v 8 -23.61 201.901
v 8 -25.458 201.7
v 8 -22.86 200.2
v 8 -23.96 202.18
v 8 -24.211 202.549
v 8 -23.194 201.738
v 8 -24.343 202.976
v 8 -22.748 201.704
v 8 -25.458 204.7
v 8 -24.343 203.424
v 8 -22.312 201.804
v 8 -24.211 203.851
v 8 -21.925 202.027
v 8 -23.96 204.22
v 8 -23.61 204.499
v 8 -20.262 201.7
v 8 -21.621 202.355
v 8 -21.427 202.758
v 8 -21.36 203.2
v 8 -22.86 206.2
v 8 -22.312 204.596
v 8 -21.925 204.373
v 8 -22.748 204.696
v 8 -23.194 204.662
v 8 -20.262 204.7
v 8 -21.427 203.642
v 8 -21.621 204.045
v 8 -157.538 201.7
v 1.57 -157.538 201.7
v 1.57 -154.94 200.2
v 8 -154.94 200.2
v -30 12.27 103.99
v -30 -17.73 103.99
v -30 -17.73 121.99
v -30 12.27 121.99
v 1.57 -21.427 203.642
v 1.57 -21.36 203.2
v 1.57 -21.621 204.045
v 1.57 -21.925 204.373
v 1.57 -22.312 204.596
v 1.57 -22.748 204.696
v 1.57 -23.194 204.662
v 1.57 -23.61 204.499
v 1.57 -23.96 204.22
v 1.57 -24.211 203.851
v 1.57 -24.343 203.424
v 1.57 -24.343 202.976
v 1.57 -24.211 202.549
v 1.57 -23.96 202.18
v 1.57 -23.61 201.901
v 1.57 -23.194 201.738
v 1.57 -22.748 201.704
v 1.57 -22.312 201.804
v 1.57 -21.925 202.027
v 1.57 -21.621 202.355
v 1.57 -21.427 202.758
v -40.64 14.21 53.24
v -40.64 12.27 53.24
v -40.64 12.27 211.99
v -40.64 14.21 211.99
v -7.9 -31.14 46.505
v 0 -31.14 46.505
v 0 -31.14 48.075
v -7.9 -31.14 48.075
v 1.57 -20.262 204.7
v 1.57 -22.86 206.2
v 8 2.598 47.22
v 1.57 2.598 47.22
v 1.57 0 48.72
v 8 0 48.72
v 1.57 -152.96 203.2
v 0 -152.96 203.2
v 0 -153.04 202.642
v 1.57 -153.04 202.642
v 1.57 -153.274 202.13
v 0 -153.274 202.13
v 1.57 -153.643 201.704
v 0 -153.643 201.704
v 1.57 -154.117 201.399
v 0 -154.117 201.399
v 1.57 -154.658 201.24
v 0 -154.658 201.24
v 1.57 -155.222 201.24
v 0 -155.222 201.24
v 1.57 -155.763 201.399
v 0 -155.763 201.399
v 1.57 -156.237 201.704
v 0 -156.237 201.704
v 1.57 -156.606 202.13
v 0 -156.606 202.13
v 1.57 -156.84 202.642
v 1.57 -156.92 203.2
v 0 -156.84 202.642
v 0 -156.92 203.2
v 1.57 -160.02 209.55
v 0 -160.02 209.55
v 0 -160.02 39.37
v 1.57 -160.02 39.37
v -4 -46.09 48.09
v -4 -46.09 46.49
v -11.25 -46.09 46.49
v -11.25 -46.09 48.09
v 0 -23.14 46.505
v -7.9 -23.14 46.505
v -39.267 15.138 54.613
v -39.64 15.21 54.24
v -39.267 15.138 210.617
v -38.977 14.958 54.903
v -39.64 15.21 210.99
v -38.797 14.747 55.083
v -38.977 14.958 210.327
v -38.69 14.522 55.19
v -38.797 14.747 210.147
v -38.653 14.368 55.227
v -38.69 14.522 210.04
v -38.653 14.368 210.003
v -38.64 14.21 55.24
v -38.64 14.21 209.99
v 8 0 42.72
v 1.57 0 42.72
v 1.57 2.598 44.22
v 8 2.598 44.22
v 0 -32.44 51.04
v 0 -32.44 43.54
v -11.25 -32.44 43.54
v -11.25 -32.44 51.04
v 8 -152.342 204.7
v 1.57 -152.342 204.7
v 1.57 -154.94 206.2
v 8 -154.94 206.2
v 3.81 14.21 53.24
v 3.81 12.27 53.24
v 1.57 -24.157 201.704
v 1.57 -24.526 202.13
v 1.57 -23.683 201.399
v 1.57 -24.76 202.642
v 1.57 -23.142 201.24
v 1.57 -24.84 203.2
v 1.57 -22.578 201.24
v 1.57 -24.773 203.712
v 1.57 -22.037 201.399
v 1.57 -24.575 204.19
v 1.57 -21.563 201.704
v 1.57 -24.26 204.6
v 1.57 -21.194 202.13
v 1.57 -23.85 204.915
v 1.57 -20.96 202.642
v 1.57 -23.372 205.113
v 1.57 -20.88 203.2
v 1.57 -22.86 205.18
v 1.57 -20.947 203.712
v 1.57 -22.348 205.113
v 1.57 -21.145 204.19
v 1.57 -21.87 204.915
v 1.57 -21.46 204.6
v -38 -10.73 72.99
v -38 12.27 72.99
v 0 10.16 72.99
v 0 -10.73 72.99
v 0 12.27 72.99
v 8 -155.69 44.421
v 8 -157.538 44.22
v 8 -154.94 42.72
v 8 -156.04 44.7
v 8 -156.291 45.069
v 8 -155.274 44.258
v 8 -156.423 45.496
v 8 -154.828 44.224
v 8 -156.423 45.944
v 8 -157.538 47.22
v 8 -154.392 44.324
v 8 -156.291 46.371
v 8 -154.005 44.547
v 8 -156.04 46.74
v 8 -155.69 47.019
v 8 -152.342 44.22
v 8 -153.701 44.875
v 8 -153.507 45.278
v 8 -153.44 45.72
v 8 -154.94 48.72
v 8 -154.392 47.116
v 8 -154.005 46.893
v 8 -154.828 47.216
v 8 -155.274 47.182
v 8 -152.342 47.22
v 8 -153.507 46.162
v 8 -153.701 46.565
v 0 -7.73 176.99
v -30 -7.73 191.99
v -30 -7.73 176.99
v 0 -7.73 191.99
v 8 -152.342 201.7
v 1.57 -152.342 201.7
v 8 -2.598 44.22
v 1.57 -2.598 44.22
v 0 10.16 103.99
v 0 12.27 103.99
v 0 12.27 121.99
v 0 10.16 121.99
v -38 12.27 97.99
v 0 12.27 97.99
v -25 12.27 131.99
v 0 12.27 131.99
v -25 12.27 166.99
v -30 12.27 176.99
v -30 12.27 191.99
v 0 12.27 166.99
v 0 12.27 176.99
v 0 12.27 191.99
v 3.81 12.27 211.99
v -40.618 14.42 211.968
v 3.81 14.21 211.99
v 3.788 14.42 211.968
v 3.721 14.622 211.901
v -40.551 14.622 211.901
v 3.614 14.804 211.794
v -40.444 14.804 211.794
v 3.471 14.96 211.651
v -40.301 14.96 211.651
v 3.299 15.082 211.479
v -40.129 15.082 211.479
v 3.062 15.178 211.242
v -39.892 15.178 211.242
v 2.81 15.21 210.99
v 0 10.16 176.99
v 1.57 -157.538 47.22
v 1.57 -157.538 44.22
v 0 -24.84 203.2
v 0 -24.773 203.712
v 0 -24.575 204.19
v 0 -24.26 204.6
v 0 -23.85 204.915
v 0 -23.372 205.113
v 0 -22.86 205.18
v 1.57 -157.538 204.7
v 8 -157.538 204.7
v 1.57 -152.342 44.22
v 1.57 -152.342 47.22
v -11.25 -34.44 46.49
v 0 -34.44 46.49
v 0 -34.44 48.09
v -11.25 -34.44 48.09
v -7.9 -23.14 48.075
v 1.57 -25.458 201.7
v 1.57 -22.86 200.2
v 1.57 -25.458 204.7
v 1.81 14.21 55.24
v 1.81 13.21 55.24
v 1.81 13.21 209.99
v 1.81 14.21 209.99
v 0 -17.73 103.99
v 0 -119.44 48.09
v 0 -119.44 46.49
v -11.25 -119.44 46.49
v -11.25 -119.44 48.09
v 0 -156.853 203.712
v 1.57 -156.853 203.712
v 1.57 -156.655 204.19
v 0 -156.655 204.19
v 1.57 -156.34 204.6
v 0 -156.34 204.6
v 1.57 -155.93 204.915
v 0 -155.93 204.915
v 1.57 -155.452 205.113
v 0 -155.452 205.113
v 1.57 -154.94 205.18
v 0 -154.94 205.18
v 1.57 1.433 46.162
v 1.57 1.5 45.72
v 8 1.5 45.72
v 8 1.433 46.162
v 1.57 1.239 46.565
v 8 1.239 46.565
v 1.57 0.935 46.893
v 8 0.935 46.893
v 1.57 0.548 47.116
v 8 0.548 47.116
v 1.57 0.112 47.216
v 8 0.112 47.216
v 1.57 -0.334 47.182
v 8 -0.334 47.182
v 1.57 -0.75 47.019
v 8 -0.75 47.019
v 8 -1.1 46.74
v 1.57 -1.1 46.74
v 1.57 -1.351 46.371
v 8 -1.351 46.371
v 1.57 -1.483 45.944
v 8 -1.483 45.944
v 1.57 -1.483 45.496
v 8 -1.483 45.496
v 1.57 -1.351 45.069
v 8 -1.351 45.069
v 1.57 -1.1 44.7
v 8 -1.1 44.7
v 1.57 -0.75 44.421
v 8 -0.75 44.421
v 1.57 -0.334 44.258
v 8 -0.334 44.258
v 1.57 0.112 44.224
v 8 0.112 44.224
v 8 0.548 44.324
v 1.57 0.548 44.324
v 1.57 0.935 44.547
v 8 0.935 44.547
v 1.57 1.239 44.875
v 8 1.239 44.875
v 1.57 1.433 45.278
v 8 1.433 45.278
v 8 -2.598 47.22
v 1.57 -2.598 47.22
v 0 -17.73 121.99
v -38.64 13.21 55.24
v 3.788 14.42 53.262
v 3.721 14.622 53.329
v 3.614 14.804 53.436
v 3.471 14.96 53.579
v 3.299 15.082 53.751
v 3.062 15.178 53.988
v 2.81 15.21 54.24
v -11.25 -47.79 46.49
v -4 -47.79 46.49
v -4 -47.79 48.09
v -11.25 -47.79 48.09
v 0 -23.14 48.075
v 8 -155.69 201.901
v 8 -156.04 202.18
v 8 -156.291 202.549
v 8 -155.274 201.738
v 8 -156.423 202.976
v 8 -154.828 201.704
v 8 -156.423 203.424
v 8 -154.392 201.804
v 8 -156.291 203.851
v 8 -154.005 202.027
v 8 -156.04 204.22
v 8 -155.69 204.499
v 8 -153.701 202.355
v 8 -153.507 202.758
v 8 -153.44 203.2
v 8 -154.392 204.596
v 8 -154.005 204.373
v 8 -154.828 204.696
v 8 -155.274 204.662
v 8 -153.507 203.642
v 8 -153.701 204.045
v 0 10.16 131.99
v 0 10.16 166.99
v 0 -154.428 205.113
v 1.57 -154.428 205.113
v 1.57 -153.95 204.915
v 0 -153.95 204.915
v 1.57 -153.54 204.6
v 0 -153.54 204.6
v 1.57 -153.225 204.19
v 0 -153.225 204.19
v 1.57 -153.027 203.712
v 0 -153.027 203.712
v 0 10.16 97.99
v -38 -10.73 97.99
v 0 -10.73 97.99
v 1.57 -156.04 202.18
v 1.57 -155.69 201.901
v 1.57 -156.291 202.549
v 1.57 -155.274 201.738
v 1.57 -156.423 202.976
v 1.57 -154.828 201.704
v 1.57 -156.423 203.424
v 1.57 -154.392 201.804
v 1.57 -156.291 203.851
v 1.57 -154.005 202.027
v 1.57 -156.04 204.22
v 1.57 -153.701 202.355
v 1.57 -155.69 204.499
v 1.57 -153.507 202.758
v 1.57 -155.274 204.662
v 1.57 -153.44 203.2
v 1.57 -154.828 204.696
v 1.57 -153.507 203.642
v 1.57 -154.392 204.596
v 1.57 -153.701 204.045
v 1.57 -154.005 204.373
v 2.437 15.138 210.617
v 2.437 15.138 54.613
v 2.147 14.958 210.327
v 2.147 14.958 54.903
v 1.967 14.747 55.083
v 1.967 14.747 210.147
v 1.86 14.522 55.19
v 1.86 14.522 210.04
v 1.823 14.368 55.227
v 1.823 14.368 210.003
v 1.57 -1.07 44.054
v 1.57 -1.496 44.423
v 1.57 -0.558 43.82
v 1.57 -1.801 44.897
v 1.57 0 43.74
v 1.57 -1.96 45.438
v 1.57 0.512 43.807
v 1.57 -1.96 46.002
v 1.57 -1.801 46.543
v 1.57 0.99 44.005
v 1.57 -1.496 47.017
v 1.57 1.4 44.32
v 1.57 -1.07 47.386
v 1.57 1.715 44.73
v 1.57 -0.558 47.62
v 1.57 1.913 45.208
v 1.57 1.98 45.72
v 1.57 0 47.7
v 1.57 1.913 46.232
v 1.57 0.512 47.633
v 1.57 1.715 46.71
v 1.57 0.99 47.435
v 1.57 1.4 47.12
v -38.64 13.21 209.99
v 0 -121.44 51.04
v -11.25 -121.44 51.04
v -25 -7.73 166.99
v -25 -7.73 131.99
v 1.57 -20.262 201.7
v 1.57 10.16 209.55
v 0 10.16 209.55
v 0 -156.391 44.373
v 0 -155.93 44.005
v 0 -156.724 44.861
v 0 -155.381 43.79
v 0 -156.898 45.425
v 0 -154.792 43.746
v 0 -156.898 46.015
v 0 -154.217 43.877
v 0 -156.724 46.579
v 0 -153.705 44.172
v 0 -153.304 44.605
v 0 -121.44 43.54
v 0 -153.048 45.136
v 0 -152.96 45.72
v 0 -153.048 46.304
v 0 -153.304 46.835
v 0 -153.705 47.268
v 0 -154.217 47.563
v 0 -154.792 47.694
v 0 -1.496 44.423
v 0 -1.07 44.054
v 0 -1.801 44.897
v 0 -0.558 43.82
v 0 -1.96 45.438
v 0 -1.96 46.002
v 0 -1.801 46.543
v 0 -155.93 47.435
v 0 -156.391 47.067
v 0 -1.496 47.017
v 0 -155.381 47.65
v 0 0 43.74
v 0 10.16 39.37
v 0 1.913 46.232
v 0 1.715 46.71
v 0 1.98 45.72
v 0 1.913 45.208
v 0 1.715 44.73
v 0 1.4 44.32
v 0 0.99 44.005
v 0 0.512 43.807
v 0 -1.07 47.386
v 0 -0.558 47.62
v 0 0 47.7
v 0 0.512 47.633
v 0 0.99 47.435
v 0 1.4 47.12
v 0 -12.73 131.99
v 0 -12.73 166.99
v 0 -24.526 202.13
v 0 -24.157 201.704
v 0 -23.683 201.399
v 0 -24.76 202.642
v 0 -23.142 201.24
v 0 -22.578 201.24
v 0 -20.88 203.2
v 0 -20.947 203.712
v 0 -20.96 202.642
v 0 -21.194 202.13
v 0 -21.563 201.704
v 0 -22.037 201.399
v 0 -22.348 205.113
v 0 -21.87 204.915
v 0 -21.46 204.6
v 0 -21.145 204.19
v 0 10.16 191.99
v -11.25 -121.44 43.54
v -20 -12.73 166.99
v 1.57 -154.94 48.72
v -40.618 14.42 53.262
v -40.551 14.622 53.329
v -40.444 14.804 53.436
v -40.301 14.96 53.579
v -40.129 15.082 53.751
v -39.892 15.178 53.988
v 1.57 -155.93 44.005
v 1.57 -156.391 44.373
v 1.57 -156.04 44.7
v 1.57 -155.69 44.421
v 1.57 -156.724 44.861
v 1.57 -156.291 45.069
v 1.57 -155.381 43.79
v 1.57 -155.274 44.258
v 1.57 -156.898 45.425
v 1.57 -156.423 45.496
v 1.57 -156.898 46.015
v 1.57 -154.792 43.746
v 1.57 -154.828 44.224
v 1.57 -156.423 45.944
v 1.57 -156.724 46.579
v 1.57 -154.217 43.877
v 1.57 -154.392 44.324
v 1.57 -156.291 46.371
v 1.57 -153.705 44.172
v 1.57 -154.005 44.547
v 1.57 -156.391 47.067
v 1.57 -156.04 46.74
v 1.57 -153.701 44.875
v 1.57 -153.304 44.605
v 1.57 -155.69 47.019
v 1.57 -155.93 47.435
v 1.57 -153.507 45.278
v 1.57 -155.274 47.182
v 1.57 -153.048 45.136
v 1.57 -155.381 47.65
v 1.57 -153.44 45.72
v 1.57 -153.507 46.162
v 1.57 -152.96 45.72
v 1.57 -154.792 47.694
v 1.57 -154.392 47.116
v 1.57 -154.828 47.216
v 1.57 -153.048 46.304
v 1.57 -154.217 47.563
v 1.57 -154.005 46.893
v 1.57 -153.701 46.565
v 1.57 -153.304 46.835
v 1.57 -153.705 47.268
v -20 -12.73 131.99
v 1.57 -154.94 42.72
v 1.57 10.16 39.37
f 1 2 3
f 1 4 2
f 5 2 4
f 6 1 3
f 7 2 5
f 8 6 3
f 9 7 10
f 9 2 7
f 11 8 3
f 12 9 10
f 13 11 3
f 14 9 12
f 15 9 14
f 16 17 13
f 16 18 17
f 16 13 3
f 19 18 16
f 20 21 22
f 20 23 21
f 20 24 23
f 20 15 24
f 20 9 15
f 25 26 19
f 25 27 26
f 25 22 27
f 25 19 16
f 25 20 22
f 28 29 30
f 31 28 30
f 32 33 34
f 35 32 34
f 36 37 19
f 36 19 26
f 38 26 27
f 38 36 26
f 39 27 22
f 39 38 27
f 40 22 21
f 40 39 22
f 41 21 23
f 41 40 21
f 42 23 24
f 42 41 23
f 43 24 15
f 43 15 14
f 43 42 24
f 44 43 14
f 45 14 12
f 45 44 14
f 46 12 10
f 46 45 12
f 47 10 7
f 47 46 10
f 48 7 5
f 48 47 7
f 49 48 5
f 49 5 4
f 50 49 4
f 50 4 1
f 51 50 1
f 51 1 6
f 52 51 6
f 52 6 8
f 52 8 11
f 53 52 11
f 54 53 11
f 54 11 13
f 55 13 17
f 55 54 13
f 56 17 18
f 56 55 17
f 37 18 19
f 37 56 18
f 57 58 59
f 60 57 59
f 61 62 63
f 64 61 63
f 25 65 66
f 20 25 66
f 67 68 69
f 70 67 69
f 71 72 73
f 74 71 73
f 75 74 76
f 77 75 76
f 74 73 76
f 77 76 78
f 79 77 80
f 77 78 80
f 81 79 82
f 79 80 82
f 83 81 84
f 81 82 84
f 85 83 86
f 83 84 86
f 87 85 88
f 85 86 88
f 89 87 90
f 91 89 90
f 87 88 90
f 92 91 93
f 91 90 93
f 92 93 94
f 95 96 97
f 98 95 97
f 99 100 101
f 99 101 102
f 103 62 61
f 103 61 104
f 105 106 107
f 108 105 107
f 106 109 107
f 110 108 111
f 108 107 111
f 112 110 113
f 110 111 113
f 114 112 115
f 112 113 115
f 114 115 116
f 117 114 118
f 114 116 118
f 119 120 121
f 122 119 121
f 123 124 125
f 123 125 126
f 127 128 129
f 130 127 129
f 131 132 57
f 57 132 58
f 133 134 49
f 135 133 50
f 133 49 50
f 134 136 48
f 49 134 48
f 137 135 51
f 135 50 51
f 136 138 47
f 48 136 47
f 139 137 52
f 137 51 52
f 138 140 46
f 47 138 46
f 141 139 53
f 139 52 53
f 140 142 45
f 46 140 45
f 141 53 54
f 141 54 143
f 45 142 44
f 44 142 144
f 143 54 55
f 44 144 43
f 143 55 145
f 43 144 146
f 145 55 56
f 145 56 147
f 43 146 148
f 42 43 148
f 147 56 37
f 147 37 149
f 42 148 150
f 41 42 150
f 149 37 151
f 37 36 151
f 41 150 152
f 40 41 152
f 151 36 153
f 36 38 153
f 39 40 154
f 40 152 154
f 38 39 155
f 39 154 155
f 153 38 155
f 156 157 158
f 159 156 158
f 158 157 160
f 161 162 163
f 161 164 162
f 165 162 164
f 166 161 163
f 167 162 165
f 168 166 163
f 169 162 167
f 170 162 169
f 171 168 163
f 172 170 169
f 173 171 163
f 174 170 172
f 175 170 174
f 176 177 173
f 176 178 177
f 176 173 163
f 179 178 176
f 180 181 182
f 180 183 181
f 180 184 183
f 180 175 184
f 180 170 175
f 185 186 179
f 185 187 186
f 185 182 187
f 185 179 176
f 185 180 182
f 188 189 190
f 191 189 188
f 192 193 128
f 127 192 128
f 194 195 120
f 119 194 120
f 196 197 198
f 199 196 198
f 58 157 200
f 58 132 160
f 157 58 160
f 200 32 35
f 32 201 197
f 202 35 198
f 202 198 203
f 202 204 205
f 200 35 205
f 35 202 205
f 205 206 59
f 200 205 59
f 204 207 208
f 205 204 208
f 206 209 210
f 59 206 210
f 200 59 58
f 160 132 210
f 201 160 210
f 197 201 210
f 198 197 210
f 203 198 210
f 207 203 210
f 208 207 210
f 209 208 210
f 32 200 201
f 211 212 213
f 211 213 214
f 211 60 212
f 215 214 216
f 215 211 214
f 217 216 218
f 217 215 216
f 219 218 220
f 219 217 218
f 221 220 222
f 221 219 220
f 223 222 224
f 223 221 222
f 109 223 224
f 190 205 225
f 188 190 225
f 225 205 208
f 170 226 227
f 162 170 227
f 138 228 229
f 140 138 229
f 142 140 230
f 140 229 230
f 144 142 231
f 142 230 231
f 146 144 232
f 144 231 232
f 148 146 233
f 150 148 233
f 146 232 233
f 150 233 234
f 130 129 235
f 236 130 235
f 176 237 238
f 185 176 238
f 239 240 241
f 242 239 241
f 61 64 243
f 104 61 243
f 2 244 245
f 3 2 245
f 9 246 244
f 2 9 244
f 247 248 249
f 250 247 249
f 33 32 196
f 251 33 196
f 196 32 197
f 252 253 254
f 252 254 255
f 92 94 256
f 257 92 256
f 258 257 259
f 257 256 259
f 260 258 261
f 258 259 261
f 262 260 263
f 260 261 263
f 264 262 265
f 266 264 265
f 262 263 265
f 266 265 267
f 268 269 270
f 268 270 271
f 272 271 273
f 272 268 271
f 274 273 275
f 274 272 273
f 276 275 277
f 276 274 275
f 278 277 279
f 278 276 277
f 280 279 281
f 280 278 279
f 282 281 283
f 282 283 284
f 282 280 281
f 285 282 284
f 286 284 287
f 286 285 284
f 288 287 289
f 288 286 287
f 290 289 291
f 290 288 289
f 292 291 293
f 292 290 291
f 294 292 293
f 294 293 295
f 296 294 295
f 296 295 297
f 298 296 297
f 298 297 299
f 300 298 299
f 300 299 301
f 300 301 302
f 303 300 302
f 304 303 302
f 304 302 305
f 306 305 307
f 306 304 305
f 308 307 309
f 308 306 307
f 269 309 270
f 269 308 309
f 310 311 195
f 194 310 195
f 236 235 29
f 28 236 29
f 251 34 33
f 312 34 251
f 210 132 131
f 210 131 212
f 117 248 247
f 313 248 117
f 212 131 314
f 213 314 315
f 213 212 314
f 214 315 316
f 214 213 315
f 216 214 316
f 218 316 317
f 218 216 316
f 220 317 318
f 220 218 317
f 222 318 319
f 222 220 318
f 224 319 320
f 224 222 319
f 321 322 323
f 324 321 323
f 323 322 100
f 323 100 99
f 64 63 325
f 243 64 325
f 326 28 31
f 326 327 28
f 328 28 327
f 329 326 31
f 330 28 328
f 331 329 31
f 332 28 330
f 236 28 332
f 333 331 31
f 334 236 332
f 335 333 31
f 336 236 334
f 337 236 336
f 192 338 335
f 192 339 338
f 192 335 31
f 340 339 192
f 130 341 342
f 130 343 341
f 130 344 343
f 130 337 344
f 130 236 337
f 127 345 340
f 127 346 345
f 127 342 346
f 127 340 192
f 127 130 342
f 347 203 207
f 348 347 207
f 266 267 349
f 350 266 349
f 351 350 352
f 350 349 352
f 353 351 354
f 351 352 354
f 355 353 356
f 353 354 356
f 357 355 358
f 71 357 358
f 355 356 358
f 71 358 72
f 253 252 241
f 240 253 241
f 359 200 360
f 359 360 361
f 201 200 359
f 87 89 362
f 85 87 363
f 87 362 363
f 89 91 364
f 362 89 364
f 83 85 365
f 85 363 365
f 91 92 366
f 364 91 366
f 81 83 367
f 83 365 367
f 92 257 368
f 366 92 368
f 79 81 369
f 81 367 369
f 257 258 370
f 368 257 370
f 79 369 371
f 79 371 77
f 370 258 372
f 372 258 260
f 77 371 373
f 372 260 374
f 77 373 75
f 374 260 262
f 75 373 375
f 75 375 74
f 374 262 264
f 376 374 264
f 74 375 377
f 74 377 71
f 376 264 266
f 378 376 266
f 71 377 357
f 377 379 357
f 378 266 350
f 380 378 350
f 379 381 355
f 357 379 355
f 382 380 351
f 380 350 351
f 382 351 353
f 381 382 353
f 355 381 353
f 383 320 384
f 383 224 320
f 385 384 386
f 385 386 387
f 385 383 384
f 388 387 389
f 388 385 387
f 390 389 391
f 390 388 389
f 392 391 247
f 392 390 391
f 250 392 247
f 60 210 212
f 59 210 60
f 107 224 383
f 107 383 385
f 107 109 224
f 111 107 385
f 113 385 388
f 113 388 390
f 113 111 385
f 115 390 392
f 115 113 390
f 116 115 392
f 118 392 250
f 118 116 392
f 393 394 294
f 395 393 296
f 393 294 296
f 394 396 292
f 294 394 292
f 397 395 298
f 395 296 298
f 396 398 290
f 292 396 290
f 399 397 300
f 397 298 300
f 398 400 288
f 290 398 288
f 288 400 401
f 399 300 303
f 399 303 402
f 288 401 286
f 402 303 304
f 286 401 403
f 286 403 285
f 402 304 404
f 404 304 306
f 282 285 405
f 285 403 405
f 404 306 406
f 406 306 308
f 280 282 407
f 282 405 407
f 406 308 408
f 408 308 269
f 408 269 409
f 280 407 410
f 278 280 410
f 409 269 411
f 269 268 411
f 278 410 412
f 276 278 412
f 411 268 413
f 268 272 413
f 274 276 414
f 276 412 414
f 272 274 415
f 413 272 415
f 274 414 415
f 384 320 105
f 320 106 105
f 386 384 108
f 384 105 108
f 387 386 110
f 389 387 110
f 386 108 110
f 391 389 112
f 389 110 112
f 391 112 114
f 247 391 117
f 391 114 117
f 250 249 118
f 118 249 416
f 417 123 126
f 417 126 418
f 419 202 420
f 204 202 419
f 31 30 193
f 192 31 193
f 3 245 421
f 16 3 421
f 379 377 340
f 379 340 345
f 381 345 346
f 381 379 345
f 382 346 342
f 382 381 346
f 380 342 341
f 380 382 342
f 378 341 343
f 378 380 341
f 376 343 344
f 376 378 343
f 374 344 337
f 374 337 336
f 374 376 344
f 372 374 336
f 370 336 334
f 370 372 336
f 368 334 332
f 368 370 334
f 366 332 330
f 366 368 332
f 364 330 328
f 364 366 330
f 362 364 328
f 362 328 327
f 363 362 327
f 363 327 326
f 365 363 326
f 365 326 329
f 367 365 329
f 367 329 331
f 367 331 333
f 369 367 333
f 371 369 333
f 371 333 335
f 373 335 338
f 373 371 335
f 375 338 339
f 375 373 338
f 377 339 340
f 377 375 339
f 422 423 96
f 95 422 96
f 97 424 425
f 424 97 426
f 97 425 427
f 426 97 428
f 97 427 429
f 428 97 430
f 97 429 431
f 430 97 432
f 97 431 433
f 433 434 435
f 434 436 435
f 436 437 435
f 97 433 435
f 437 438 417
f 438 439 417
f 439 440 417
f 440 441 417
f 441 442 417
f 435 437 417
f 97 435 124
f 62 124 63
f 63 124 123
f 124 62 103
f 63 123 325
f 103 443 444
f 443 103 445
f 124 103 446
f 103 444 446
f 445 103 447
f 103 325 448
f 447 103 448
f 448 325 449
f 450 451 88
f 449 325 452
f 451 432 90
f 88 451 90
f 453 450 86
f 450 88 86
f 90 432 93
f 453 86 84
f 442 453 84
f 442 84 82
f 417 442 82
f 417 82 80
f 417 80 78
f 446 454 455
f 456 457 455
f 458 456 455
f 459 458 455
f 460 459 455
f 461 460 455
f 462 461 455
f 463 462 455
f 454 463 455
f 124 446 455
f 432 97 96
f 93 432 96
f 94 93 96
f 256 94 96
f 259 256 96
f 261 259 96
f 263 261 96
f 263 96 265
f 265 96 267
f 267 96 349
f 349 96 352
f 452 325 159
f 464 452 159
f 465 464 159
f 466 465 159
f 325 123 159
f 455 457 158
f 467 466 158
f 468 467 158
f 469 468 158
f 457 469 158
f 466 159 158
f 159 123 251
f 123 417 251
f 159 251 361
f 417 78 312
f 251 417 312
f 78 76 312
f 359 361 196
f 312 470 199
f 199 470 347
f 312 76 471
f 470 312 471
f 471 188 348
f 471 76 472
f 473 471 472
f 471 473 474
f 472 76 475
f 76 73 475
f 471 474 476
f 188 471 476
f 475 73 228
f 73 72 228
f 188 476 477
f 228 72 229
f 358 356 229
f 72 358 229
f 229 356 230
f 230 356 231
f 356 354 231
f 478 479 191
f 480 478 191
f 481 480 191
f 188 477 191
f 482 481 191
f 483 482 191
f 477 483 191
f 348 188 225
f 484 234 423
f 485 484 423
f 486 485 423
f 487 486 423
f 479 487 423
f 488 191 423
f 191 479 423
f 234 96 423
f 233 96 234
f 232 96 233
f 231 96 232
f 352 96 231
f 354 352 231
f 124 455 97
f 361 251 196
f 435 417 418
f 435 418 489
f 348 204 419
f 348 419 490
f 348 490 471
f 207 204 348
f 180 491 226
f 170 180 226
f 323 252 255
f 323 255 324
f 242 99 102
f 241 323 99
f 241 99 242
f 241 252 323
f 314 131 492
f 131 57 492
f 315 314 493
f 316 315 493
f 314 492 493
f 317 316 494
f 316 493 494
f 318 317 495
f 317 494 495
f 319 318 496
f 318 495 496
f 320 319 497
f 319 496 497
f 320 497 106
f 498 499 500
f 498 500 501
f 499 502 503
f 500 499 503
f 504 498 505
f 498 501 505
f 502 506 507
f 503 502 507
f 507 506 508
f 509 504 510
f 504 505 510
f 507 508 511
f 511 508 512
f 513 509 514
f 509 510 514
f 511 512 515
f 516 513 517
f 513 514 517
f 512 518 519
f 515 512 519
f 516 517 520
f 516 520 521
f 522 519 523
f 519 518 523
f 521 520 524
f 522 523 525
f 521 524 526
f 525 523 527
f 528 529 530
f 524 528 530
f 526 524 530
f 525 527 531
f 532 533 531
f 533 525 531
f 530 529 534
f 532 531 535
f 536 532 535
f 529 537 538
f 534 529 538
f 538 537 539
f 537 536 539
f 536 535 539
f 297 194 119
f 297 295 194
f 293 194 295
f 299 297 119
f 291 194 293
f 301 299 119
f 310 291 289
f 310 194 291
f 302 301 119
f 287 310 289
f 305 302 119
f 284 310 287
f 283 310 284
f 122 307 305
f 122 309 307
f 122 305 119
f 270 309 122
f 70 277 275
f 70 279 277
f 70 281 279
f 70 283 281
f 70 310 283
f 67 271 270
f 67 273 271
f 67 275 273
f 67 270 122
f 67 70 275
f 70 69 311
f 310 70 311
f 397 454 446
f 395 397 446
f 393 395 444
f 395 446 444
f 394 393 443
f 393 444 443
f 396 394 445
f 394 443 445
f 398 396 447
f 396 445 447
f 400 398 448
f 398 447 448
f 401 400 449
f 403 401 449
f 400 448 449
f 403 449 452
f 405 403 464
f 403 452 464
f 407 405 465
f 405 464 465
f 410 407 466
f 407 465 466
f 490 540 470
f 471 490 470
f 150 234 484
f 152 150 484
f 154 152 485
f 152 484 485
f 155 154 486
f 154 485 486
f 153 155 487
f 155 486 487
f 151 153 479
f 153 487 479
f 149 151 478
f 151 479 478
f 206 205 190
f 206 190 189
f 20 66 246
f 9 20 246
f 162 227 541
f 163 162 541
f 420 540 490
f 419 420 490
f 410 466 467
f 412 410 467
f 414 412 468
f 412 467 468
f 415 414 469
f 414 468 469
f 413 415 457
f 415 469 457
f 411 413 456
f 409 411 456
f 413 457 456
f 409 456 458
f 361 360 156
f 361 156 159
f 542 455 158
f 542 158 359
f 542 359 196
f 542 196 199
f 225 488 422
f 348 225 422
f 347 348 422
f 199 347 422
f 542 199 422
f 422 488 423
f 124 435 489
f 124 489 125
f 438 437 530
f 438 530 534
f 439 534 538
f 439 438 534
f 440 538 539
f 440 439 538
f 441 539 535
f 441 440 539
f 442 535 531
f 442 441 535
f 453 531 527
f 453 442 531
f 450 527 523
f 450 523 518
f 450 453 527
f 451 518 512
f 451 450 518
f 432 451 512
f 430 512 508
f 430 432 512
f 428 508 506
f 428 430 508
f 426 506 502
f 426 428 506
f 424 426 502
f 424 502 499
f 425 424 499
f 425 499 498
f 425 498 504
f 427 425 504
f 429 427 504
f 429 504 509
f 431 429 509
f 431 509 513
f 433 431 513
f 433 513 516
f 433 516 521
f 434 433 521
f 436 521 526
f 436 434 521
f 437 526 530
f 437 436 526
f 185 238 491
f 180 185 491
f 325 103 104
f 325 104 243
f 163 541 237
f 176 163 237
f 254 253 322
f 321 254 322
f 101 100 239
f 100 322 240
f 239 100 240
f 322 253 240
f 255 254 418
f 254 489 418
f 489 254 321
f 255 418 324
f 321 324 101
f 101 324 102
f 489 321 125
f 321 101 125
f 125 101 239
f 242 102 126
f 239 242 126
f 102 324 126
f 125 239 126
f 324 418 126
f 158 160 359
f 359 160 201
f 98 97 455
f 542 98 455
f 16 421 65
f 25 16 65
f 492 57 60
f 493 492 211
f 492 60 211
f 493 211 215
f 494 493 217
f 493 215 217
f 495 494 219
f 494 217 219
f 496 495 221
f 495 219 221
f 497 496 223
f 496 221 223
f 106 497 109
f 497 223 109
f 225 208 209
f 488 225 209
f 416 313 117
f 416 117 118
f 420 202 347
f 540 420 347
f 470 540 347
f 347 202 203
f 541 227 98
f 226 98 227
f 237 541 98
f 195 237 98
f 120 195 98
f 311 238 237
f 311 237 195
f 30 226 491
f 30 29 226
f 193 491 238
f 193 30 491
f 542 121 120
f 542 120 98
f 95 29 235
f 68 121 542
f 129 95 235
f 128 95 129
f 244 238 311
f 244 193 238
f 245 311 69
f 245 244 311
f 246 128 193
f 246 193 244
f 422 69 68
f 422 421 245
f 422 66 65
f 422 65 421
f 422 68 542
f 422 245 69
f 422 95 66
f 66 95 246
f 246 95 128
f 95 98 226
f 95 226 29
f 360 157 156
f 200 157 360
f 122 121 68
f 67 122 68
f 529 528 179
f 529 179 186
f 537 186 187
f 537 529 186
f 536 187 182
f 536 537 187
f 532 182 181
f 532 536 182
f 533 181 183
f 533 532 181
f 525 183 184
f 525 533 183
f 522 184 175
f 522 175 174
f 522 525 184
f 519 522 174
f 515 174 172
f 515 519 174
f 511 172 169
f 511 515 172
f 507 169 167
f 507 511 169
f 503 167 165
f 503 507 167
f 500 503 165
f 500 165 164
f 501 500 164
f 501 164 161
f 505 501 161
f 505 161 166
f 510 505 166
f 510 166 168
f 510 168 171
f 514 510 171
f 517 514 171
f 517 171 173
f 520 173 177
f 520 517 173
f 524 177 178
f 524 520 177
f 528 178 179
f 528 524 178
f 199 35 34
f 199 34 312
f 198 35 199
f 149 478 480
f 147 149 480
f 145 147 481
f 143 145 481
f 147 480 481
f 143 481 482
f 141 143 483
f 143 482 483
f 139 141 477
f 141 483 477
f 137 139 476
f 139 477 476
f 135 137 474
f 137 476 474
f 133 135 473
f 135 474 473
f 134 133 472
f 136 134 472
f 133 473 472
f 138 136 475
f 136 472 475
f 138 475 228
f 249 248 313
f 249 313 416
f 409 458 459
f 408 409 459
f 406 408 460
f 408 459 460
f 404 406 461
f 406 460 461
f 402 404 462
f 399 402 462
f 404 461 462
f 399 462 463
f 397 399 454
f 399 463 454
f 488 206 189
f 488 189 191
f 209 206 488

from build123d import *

# Parameters (mm, degrees)
F0_W          = 10.16
F0_H          = 6.35
F0_R          = 1.98
F0_W_2        = 8
F0_H_2        = 1.57
F0_W_3        = 71.65
F0_H_3        = 1.6
F0_W_4        = 11.65
F1_DEPTH      = 1.57
F2_DEPTH      = 11.25
F3_R          = 1.5
F4_DEPTH      = 6.43
F0_W_5        = 0.94
F0_H_4        = 158.75
F5_DEPTH      = 3.81
F5_DEPTH_BACK = 40.64
F6_W          = 44.45
F6_H          = 158.75
F6_W_2        = 40.45
F6_H_2        = 154.75
F7_DEPTH      = 2
F8_R          = 0.99999
F9_W          = 30
F9_H          = 15
F10_DEPTH     = 20
F9_W_2        = 25
F9_H_2        = 35
F11_DEPTH     = 25
F9_H_3        = 18
F12_DEPTH     = 30
F9_W_3        = 38
F9_H_4        = 25
F13_DEPTH     = 23
F14_SIZE      = 5
F15_W         = 4
F15_H         = 1.6
F16_DEPTH     = 2
F17_DEPTH     = 7.9


# Not quite as in the source:
# - a fillet or chamfer is up to 0.001 mm smaller than in the source, because OpenCascade refuses the exact size


with BuildPart() as f1:
    # F0 (on Right) → F1 (new body)
    with BuildSketch(Plane.YZ):
        with Locations((5.08, 206.375)):
            Rectangle(F0_W, F0_H)
        with BuildLine():
            Line((0, 203.2), (0, 209.55))
            Line((0, 209.55), (-22.86, 209.55))
            Line((-22.86, 209.55), (-22.86, 205.18))
            ThreePointArc((-22.86, 205.18), (-21.4599285733, 204.6000714267), (-20.88, 203.2))
            Line((-20.88, 203.2), (0, 203.2))
        make_face()
        with BuildLine():
            Line((-22.86, 205.18), (-22.86, 209.55))
            Line((-22.86, 209.55), (-154.94, 209.55))
            Line((-154.94, 209.55), (-154.94, 205.18))
            ThreePointArc((-154.94, 205.18), (-153.5399285733, 204.6000714267), (-152.96, 203.2))
            Line((-152.96, 203.2), (-24.84, 203.2))
            ThreePointArc((-24.84, 203.2), (-24.2600714267, 204.6000714267), (-22.86, 205.18))
        make_face()
        with BuildLine():
            Line((-154.94, 205.18), (-154.94, 209.55))
            Line((-154.94, 209.55), (-160.02, 209.55))
            Line((-160.02, 209.55), (-160.02, 203.2))
            Line((-160.02, 203.2), (-156.92, 203.2))
            ThreePointArc((-156.92, 203.2), (-156.3400714267, 204.6000714267), (-154.94, 205.18))
        make_face()
        with BuildLine():
            Line((0, 47.7), (0, 203.2))
            Line((0, 203.2), (-20.88, 203.2))
            ThreePointArc((-20.88, 203.2), (-22.86, 201.22), (-24.84, 203.2))
            Line((-24.84, 203.2), (-152.96, 203.2))
            ThreePointArc((-152.96, 203.2), (-154.94, 201.22), (-156.92, 203.2))
            Line((-156.92, 203.2), (-160.02, 203.2))
            Line((-160.02, 203.2), (-160.02, 39.37))
            Line((-160.02, 39.37), (0, 39.37))
            Line((0, 39.37), (0, 43.74))
            ThreePointArc((0, 43.74), (-1.98, 45.72), (0, 47.7))
        make_face()
        with Locations((-154.94, 45.72)):
            Circle(F0_R, mode=Mode.SUBTRACT)
        Polygon((-121.44, 51.04), (-46.94, 51.04), (-32.44, 51.04), (-32.44, 43.54), (-46.94, 43.54), (-121.44, 43.54), align=None, mode=Mode.SUBTRACT)
        with Locations((-27.14, 47.29)):
            Rectangle(F0_W_2, F0_H_2, mode=Mode.SUBTRACT)
        with BuildLine():
            Line((10.16, 45.72), (10.16, 203.2))
            Line((10.16, 203.2), (0, 203.2))
            Line((0, 203.2), (0, 47.7))
            ThreePointArc((0, 47.7), (1.4000714267, 47.1200714267), (1.98, 45.72))
            Line((1.98, 45.72), (10.16, 45.72))
        make_face()
        with BuildLine():
            Line((10.16, 39.37), (10.16, 45.72))
            Line((10.16, 45.72), (1.98, 45.72))
            ThreePointArc((1.98, 45.72), (1.4000714267, 44.3199285733), (0, 43.74))
            Line((0, 43.74), (0, 39.37))
            Line((0, 39.37), (10.16, 39.37))
        make_face()
        Polygon((-32.44, 51.04), (-46.94, 51.04), (-121.44, 51.04), (-121.44, 43.54), (-46.94, 43.54), (-32.44, 43.54), align=None)
        with Locations((-83.615, 47.29)):
            Rectangle(F0_W_3, F0_H_3, mode=Mode.SUBTRACT)
        with Locations((-40.265, 47.29)):
            Rectangle(F0_W_4, F0_H_3, mode=Mode.SUBTRACT)
        with Locations((-40.265, 47.29)):
            Rectangle(F0_W_4, F0_H_3)
        with Locations((-83.615, 47.29)):
            Rectangle(F0_W_3, F0_H_3)
        with Locations((-27.14, 47.29)):
            Rectangle(F0_W_2, F0_H_2)
    extrude(amount=F1_DEPTH)

    # F0 (on Right) → F2 (join)
    with BuildSketch(Plane.YZ):
        Polygon((-32.44, 51.04), (-46.94, 51.04), (-121.44, 51.04), (-121.44, 43.54), (-46.94, 43.54), (-32.44, 43.54), align=None)
        with Locations((-83.615, 47.29)):
            Rectangle(F0_W_3, F0_H_3, mode=Mode.SUBTRACT)
        with Locations((-40.265, 47.29)):
            Rectangle(F0_W_4, F0_H_3, mode=Mode.SUBTRACT)
    extrude(amount=-F2_DEPTH)

    # F3 (on face) → F4 (join)
    with BuildSketch(Plane.YZ.offset(1.57)):
        Polygon((-154.94, 200.2), (-152.3419237886, 201.7), (-152.3419237886, 204.7), (-154.94, 206.2), (-157.5380762114, 204.7), (-157.5380762114, 201.7), align=None)
        with Locations((-154.94, 203.2)):
            Circle(F3_R, mode=Mode.SUBTRACT)
        Polygon((-154.94, 42.72), (-152.3419237886, 44.22), (-152.3419237886, 47.22), (-154.94, 48.72), (-157.5380762114, 47.22), (-157.5380762114, 44.22), align=None)
        with Locations((-154.94, 45.72)):
            Circle(F3_R, mode=Mode.SUBTRACT)
        Polygon((0, 42.72), (2.5980762114, 44.22), (2.5980762114, 47.22), (0, 48.72), (-2.5980762114, 47.22), (-2.5980762114, 44.22), align=None)
        with Locations((0, 45.72)):
            Circle(F3_R, mode=Mode.SUBTRACT)
        Polygon((-22.86, 200.2), (-20.2619237886, 201.7), (-20.2619237886, 204.7), (-22.86, 206.2), (-25.4580762114, 204.7), (-25.4580762114, 201.7), align=None)
        with Locations((-22.86, 203.2)):
            Circle(F3_R, mode=Mode.SUBTRACT)
    extrude(amount=F4_DEPTH)



with BuildPart() as f5:
    # F0 (on Right) → F5 (new body, two sides)
    with BuildSketch(Plane.YZ) as f5_sk:
        with Locations((12.74, 132.615)):
            Rectangle(F0_W_5, F0_H_4)
    extrude(amount=F5_DEPTH)
    extrude(f5_sk.sketch, amount=-F5_DEPTH_BACK)

    # F6 (on face) → F7 (join)
    with BuildSketch(Plane(origin=(0, 13.21, 0), x_dir=(-1, 0, 0), z_dir=(0, 1, 0))):
        with Locations((18.415, 132.615)):
            Rectangle(F6_W, F6_H)
        with Locations((18.415, 132.615)):
            Rectangle(F6_W_2, F6_H_2, mode=Mode.SUBTRACT)
    extrude(amount=F7_DEPTH)

    # F8 (radius 1 in the source; OpenCascade refuses exactly that, so slightly less here)
    f8_edges = [f5.edges().sort_by_distance(p)[0] for p in [
        (1.81, 15.21, 132.615),
        (-18.415, 15.21, 209.99),
        (-38.64, 15.21, 132.615),
        (-18.415, 15.21, 55.24),
        (-18.415, 15.21, 53.24),
        (-40.64, 15.21, 132.615),
        (3.81, 15.21, 132.615),
        (-18.415, 15.21, 211.99),
    ]]
    fillet(f8_edges, radius=F8_R)


with BuildPart() as f1_1:
    add(f1.part)

    add(f5.part)  # F10 merges F5
    # F9 (on face) → F10 (join)
    with BuildSketch(Plane.XZ.offset(-12.27)):
        with Locations((-15, 184.49)):
            Rectangle(F9_W, F9_H)
    extrude(amount=F10_DEPTH)

    # F9 (on face) → F11 (join)
    with BuildSketch(Plane.XZ.offset(-12.27)):
        with Locations((-12.5, 149.49)):
            Rectangle(F9_W_2, F9_H_2)
    extrude(amount=F11_DEPTH)

    # F9 (on face) → F12 (join)
    with BuildSketch(Plane.XZ.offset(-12.27)):
        with Locations((-15, 112.99)):
            Rectangle(F9_W, F9_H_3)
    extrude(amount=F12_DEPTH)

    # F9 (on face) → F13 (join)
    with BuildSketch(Plane.XZ.offset(-12.27)):
        with Locations((-19, 85.49)):
            Rectangle(F9_W_3, F9_H_4)
    extrude(amount=F13_DEPTH)

    # F14
    f14_edges = [f1_1.edges().sort_by_distance(p)[0] for p in [
        (-25, -12.73, 149.49),
    ]]
    chamfer(f14_edges, length=F14_SIZE)

    # F15 (on face) → F16 (cut)
    with BuildSketch(Plane(origin=(0, -46.09, 0), x_dir=(-1, 0, 0), z_dir=(0, 1, 0))):
        with Locations((2, 47.29)):
            Rectangle(F15_W, F15_H)
    extrude(amount=-F16_DEPTH, mode=Mode.SUBTRACT)

    # F0 (on Right) → F17 (join)
    with BuildSketch(Plane.YZ):
        with Locations((-27.14, 47.29)):
            Rectangle(F0_W_2, F0_H_2)
    extrude(amount=-F17_DEPTH)


solid = f1_1.part
